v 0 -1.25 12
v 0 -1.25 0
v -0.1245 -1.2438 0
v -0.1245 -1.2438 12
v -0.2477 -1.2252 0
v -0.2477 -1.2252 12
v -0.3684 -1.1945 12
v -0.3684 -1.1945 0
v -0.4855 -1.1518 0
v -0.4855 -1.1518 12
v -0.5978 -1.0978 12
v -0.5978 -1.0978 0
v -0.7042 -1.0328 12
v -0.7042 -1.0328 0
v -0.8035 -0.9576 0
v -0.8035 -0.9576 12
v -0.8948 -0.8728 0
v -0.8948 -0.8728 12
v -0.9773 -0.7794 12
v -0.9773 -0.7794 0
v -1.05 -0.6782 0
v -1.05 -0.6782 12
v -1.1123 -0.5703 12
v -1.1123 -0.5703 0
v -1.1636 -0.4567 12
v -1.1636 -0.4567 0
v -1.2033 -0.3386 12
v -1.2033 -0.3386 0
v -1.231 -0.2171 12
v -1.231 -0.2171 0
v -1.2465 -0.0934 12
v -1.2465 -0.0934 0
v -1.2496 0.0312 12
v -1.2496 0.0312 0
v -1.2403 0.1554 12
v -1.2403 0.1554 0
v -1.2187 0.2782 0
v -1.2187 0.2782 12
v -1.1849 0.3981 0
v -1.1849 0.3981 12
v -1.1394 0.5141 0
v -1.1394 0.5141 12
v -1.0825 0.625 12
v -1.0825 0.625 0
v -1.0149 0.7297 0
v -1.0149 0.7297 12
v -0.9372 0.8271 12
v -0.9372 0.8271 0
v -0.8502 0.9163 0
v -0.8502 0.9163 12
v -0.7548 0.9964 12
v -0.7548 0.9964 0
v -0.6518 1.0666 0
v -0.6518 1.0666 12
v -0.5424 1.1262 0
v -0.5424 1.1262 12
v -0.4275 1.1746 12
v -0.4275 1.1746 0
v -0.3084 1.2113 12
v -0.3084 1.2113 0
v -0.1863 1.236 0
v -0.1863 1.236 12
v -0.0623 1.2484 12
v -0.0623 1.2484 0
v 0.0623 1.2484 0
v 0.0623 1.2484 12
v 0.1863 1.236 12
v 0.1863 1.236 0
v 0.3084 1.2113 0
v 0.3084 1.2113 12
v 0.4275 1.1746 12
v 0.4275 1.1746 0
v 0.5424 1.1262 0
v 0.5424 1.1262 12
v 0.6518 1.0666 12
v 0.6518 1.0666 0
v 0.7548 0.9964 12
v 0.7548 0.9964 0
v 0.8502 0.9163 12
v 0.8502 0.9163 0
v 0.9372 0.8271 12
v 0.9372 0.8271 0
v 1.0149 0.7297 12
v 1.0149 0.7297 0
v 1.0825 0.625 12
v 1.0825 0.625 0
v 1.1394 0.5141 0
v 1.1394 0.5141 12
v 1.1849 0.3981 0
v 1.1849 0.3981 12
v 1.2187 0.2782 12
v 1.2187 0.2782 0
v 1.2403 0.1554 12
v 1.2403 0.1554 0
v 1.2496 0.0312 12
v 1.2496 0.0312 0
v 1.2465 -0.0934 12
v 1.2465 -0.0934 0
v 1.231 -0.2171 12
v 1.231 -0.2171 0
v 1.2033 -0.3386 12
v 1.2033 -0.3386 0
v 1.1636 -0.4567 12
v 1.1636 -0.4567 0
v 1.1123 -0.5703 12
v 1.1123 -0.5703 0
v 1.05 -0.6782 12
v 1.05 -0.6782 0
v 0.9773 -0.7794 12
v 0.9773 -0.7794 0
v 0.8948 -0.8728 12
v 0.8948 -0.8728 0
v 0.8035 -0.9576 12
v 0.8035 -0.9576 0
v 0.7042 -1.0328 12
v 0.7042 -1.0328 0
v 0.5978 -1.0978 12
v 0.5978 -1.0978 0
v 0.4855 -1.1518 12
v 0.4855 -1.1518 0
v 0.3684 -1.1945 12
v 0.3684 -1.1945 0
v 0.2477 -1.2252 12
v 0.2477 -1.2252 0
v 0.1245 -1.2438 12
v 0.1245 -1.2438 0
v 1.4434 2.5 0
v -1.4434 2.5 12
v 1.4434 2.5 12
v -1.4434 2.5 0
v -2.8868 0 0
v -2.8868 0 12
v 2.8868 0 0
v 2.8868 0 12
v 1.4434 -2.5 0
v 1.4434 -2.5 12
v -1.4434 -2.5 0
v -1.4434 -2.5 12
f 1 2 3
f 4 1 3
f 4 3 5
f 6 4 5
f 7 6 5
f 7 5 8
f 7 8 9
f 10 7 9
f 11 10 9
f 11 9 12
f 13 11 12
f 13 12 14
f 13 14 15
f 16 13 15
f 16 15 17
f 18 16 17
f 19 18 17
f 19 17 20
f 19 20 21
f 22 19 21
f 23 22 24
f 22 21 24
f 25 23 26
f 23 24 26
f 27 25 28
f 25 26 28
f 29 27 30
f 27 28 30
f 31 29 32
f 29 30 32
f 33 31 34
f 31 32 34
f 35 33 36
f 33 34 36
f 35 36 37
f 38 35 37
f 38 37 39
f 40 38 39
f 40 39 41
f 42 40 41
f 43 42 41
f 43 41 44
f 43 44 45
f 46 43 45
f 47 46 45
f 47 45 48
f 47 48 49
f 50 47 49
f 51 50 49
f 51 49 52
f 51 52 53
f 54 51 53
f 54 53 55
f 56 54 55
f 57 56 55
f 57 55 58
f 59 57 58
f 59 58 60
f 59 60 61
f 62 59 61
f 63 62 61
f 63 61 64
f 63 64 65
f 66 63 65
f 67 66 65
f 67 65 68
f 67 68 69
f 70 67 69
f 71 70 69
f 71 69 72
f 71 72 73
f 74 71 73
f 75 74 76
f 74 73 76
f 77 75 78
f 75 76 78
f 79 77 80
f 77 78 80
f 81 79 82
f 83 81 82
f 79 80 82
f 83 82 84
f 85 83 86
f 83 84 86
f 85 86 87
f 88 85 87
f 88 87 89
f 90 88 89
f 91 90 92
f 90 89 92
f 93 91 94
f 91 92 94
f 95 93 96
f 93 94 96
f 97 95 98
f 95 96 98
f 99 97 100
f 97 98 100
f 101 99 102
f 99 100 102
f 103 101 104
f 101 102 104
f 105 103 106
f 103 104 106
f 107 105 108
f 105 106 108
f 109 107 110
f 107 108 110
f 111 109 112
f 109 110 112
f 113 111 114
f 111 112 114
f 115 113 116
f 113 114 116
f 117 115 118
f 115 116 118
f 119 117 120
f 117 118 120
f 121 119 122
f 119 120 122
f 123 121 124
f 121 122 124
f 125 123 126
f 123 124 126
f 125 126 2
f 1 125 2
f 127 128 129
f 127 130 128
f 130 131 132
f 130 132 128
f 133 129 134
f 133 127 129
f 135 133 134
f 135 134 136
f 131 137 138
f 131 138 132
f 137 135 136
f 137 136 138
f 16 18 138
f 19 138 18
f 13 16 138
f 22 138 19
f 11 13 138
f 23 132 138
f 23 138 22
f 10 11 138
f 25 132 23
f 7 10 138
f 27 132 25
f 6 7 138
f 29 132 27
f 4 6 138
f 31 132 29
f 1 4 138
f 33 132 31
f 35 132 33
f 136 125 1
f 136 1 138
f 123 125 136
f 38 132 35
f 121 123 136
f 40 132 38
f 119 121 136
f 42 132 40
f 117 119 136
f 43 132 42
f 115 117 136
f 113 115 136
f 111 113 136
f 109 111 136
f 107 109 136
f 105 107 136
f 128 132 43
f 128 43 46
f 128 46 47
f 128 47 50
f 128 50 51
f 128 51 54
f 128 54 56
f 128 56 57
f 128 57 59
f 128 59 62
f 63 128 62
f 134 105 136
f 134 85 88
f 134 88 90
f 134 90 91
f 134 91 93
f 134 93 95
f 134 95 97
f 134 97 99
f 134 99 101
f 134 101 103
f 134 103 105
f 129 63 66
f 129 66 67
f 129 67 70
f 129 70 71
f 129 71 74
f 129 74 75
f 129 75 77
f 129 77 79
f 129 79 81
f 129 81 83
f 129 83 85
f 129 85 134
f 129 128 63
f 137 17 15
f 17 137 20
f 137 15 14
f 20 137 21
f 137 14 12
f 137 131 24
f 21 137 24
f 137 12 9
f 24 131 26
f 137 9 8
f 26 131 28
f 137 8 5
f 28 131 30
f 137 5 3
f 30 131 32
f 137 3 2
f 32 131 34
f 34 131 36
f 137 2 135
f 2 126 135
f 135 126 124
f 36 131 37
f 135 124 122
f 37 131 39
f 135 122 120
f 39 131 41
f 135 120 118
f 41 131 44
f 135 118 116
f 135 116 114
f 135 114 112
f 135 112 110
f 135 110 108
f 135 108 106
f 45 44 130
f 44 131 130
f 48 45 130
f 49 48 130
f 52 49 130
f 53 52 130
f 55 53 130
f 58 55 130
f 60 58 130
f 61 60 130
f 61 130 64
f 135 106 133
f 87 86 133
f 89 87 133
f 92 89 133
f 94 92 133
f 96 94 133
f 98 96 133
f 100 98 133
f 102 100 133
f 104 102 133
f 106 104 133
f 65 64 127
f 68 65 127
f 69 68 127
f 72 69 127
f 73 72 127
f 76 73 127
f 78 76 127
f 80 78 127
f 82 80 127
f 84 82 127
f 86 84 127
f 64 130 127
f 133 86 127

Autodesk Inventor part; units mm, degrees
ref_plane "YZ Plane" through (0, 0, 0) normal (1, 0, 0) x (0, 1, 0)
ref_plane "XZ Plane" through (0, 0, 0) normal (0, 1, 0) x (-1, 0, 0)
ref_plane "XY Plane" through (0, 0, 0) normal (0, 0, 1) x (1, 0, 0)
sketch "Skizze1" plane through (0, 0, 0) normal (0, 0, 1) x (1, 0, 0)
  line L0 (-1.4434, 2.5) -> (1.4434, 2.5)
  line L1 (1.4434, 2.5) -> (2.8868, 0)
  line L2 (2.8868, 0) -> (1.4434, -2.5)
  line L3 (1.4434, -2.5) -> (-1.4434, -2.5)
  line L4 (-1.4434, -2.5) -> (-2.8868, 0)
  line L5 (-2.8868, 0) -> (-1.4434, 2.5)
  point P0 (0, 0)
  point P1 (0, 0)
  point P2 (0, 2.5)
  point P3 (0, -2.5)
  dimension "d3" = 120
  dimension "d4" = 120
  dimension "d5" = 120
  dimension "d6" = 5
extrude "Extrusion1" add sketch "Skizze1" along normal blind 12
sketch "Skizze2" plane through (0, 0, 12) normal (0, 0, 1) x (1, 0, 0)
  point P0 (0, 0)
  point P1 (0, 0)
hole "Bohrung1" at (0, 0, 12) direction (0, 0, -1) diameter 2.5 end through all
thread "Gewinde1" size "M2.5x0.45" class "6H" standard "ANSI Metric M Profile" full length
properties part number "12mm_Innengewinde"
